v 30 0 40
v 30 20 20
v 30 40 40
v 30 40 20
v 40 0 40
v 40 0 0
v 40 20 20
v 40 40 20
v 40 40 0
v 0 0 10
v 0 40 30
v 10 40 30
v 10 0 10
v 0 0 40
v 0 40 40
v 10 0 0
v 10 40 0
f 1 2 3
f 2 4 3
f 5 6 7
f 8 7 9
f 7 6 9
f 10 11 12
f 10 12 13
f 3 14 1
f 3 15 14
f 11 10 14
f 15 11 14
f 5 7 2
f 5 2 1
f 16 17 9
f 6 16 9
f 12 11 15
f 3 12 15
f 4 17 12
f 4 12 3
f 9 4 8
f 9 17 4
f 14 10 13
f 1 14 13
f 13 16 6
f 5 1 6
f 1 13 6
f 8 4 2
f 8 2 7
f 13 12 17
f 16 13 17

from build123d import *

# Parameters (mm, degrees)
SKETCH1_W           = 40
SKETCH1_H           = 40
BOSS_EXTRUDE1_DEPTH = 40
SKETCH2_W           = 10
SKETCH2_H           = 10
CUT_EXTRUDE1_DEPTH  = 40
SKETCH6_W           = 10
SKETCH6_H           = 20
CUT_EXTRUDE4_DEPTH  = 20
SKETCH7_W           = 10
SKETCH7_H           = 20
CUT_EXTRUDE5_DEPTH  = 10
SKETCH12_W          = 10
SKETCH12_H          = 20
CUT_EXTRUDE11_DEPTH = 10
SKETCH13_W          = 10
SKETCH13_H          = 20
BOSS_EXTRUDE4_DEPTH = 10
CUT_EXTRUDE12_DEPTH = 10
BOSS_EXTRUDE5_DEPTH = 10
CUT_EXTRUDE15_DEPTH = 10


with BuildPart() as part:
    # Sketch1 → Boss-Extrude1 (new body)
    with BuildSketch(Plane.XY):
        with Locations((20, 20)):
            Rectangle(SKETCH1_W, SKETCH1_H)
    extrude(amount=BOSS_EXTRUDE1_DEPTH)

    # Sketch2 → Cut-Extrude1 (cut)
    with BuildSketch(Plane(origin=(0, 40, 0), x_dir=(1, 0, 0), z_dir=(0, 1, 0))):
        with Locations((5, -5)):
            Rectangle(SKETCH2_W, SKETCH2_H)
    extrude(amount=-CUT_EXTRUDE1_DEPTH, mode=Mode.SUBTRACT)

    # Sketch6 → Cut-Extrude4 (cut)
    with BuildSketch(Plane.XY.offset(40)):
        with Locations((35, 30)):
            Rectangle(SKETCH6_W, SKETCH6_H)
    extrude(amount=-CUT_EXTRUDE4_DEPTH, mode=Mode.SUBTRACT)

    # Sketch7 → Cut-Extrude5 (cut)
    with BuildSketch(Plane.XY.offset(40)):
        with Locations((35, 10)):
            Rectangle(SKETCH7_W, SKETCH7_H)
    extrude(amount=-CUT_EXTRUDE5_DEPTH, mode=Mode.SUBTRACT)

    # Sketch12 → Cut-Extrude11 (cut)
    with BuildSketch(Plane(origin=(0, 40, 0), x_dir=(1, 0, 0), z_dir=(0, 1, 0))):
        with Locations((5, -20)):
            Rectangle(SKETCH12_W, SKETCH12_H)
    extrude(amount=-CUT_EXTRUDE11_DEPTH, mode=Mode.SUBTRACT)

    # Sketch13 → Boss-Extrude4 (add)
    with BuildSketch(Plane.XY.offset(30)):
        with Locations((35, 10)):
            Rectangle(SKETCH13_W, SKETCH13_H)
    extrude(amount=BOSS_EXTRUDE4_DEPTH)

    # Sketch15 → Cut-Extrude12 (cut)
    with BuildSketch(Plane(origin=(40, 0, 0), x_dir=(0, 0, -1), z_dir=(1, 0, 0))):
        Polygon((-20, 20), (-40, 0), (-40, 20), align=None)
    extrude(amount=-CUT_EXTRUDE12_DEPTH, mode=Mode.SUBTRACT)

    # Sketch16 → Boss-Extrude5 (add)
    with BuildSketch(Plane.ZY):
        Polygon((30, 40), (25, 30), (30, 30), align=None)
    extrude(amount=-BOSS_EXTRUDE5_DEPTH)

    # Sketch17 → Cut-Extrude15 (cut)
    with BuildSketch(Plane.ZY):
        Polygon((25, 30), (10, 0), (10, 30), align=None)
    extrude(amount=-CUT_EXTRUDE15_DEPTH, mode=Mode.SUBTRACT)


solid = part.part
